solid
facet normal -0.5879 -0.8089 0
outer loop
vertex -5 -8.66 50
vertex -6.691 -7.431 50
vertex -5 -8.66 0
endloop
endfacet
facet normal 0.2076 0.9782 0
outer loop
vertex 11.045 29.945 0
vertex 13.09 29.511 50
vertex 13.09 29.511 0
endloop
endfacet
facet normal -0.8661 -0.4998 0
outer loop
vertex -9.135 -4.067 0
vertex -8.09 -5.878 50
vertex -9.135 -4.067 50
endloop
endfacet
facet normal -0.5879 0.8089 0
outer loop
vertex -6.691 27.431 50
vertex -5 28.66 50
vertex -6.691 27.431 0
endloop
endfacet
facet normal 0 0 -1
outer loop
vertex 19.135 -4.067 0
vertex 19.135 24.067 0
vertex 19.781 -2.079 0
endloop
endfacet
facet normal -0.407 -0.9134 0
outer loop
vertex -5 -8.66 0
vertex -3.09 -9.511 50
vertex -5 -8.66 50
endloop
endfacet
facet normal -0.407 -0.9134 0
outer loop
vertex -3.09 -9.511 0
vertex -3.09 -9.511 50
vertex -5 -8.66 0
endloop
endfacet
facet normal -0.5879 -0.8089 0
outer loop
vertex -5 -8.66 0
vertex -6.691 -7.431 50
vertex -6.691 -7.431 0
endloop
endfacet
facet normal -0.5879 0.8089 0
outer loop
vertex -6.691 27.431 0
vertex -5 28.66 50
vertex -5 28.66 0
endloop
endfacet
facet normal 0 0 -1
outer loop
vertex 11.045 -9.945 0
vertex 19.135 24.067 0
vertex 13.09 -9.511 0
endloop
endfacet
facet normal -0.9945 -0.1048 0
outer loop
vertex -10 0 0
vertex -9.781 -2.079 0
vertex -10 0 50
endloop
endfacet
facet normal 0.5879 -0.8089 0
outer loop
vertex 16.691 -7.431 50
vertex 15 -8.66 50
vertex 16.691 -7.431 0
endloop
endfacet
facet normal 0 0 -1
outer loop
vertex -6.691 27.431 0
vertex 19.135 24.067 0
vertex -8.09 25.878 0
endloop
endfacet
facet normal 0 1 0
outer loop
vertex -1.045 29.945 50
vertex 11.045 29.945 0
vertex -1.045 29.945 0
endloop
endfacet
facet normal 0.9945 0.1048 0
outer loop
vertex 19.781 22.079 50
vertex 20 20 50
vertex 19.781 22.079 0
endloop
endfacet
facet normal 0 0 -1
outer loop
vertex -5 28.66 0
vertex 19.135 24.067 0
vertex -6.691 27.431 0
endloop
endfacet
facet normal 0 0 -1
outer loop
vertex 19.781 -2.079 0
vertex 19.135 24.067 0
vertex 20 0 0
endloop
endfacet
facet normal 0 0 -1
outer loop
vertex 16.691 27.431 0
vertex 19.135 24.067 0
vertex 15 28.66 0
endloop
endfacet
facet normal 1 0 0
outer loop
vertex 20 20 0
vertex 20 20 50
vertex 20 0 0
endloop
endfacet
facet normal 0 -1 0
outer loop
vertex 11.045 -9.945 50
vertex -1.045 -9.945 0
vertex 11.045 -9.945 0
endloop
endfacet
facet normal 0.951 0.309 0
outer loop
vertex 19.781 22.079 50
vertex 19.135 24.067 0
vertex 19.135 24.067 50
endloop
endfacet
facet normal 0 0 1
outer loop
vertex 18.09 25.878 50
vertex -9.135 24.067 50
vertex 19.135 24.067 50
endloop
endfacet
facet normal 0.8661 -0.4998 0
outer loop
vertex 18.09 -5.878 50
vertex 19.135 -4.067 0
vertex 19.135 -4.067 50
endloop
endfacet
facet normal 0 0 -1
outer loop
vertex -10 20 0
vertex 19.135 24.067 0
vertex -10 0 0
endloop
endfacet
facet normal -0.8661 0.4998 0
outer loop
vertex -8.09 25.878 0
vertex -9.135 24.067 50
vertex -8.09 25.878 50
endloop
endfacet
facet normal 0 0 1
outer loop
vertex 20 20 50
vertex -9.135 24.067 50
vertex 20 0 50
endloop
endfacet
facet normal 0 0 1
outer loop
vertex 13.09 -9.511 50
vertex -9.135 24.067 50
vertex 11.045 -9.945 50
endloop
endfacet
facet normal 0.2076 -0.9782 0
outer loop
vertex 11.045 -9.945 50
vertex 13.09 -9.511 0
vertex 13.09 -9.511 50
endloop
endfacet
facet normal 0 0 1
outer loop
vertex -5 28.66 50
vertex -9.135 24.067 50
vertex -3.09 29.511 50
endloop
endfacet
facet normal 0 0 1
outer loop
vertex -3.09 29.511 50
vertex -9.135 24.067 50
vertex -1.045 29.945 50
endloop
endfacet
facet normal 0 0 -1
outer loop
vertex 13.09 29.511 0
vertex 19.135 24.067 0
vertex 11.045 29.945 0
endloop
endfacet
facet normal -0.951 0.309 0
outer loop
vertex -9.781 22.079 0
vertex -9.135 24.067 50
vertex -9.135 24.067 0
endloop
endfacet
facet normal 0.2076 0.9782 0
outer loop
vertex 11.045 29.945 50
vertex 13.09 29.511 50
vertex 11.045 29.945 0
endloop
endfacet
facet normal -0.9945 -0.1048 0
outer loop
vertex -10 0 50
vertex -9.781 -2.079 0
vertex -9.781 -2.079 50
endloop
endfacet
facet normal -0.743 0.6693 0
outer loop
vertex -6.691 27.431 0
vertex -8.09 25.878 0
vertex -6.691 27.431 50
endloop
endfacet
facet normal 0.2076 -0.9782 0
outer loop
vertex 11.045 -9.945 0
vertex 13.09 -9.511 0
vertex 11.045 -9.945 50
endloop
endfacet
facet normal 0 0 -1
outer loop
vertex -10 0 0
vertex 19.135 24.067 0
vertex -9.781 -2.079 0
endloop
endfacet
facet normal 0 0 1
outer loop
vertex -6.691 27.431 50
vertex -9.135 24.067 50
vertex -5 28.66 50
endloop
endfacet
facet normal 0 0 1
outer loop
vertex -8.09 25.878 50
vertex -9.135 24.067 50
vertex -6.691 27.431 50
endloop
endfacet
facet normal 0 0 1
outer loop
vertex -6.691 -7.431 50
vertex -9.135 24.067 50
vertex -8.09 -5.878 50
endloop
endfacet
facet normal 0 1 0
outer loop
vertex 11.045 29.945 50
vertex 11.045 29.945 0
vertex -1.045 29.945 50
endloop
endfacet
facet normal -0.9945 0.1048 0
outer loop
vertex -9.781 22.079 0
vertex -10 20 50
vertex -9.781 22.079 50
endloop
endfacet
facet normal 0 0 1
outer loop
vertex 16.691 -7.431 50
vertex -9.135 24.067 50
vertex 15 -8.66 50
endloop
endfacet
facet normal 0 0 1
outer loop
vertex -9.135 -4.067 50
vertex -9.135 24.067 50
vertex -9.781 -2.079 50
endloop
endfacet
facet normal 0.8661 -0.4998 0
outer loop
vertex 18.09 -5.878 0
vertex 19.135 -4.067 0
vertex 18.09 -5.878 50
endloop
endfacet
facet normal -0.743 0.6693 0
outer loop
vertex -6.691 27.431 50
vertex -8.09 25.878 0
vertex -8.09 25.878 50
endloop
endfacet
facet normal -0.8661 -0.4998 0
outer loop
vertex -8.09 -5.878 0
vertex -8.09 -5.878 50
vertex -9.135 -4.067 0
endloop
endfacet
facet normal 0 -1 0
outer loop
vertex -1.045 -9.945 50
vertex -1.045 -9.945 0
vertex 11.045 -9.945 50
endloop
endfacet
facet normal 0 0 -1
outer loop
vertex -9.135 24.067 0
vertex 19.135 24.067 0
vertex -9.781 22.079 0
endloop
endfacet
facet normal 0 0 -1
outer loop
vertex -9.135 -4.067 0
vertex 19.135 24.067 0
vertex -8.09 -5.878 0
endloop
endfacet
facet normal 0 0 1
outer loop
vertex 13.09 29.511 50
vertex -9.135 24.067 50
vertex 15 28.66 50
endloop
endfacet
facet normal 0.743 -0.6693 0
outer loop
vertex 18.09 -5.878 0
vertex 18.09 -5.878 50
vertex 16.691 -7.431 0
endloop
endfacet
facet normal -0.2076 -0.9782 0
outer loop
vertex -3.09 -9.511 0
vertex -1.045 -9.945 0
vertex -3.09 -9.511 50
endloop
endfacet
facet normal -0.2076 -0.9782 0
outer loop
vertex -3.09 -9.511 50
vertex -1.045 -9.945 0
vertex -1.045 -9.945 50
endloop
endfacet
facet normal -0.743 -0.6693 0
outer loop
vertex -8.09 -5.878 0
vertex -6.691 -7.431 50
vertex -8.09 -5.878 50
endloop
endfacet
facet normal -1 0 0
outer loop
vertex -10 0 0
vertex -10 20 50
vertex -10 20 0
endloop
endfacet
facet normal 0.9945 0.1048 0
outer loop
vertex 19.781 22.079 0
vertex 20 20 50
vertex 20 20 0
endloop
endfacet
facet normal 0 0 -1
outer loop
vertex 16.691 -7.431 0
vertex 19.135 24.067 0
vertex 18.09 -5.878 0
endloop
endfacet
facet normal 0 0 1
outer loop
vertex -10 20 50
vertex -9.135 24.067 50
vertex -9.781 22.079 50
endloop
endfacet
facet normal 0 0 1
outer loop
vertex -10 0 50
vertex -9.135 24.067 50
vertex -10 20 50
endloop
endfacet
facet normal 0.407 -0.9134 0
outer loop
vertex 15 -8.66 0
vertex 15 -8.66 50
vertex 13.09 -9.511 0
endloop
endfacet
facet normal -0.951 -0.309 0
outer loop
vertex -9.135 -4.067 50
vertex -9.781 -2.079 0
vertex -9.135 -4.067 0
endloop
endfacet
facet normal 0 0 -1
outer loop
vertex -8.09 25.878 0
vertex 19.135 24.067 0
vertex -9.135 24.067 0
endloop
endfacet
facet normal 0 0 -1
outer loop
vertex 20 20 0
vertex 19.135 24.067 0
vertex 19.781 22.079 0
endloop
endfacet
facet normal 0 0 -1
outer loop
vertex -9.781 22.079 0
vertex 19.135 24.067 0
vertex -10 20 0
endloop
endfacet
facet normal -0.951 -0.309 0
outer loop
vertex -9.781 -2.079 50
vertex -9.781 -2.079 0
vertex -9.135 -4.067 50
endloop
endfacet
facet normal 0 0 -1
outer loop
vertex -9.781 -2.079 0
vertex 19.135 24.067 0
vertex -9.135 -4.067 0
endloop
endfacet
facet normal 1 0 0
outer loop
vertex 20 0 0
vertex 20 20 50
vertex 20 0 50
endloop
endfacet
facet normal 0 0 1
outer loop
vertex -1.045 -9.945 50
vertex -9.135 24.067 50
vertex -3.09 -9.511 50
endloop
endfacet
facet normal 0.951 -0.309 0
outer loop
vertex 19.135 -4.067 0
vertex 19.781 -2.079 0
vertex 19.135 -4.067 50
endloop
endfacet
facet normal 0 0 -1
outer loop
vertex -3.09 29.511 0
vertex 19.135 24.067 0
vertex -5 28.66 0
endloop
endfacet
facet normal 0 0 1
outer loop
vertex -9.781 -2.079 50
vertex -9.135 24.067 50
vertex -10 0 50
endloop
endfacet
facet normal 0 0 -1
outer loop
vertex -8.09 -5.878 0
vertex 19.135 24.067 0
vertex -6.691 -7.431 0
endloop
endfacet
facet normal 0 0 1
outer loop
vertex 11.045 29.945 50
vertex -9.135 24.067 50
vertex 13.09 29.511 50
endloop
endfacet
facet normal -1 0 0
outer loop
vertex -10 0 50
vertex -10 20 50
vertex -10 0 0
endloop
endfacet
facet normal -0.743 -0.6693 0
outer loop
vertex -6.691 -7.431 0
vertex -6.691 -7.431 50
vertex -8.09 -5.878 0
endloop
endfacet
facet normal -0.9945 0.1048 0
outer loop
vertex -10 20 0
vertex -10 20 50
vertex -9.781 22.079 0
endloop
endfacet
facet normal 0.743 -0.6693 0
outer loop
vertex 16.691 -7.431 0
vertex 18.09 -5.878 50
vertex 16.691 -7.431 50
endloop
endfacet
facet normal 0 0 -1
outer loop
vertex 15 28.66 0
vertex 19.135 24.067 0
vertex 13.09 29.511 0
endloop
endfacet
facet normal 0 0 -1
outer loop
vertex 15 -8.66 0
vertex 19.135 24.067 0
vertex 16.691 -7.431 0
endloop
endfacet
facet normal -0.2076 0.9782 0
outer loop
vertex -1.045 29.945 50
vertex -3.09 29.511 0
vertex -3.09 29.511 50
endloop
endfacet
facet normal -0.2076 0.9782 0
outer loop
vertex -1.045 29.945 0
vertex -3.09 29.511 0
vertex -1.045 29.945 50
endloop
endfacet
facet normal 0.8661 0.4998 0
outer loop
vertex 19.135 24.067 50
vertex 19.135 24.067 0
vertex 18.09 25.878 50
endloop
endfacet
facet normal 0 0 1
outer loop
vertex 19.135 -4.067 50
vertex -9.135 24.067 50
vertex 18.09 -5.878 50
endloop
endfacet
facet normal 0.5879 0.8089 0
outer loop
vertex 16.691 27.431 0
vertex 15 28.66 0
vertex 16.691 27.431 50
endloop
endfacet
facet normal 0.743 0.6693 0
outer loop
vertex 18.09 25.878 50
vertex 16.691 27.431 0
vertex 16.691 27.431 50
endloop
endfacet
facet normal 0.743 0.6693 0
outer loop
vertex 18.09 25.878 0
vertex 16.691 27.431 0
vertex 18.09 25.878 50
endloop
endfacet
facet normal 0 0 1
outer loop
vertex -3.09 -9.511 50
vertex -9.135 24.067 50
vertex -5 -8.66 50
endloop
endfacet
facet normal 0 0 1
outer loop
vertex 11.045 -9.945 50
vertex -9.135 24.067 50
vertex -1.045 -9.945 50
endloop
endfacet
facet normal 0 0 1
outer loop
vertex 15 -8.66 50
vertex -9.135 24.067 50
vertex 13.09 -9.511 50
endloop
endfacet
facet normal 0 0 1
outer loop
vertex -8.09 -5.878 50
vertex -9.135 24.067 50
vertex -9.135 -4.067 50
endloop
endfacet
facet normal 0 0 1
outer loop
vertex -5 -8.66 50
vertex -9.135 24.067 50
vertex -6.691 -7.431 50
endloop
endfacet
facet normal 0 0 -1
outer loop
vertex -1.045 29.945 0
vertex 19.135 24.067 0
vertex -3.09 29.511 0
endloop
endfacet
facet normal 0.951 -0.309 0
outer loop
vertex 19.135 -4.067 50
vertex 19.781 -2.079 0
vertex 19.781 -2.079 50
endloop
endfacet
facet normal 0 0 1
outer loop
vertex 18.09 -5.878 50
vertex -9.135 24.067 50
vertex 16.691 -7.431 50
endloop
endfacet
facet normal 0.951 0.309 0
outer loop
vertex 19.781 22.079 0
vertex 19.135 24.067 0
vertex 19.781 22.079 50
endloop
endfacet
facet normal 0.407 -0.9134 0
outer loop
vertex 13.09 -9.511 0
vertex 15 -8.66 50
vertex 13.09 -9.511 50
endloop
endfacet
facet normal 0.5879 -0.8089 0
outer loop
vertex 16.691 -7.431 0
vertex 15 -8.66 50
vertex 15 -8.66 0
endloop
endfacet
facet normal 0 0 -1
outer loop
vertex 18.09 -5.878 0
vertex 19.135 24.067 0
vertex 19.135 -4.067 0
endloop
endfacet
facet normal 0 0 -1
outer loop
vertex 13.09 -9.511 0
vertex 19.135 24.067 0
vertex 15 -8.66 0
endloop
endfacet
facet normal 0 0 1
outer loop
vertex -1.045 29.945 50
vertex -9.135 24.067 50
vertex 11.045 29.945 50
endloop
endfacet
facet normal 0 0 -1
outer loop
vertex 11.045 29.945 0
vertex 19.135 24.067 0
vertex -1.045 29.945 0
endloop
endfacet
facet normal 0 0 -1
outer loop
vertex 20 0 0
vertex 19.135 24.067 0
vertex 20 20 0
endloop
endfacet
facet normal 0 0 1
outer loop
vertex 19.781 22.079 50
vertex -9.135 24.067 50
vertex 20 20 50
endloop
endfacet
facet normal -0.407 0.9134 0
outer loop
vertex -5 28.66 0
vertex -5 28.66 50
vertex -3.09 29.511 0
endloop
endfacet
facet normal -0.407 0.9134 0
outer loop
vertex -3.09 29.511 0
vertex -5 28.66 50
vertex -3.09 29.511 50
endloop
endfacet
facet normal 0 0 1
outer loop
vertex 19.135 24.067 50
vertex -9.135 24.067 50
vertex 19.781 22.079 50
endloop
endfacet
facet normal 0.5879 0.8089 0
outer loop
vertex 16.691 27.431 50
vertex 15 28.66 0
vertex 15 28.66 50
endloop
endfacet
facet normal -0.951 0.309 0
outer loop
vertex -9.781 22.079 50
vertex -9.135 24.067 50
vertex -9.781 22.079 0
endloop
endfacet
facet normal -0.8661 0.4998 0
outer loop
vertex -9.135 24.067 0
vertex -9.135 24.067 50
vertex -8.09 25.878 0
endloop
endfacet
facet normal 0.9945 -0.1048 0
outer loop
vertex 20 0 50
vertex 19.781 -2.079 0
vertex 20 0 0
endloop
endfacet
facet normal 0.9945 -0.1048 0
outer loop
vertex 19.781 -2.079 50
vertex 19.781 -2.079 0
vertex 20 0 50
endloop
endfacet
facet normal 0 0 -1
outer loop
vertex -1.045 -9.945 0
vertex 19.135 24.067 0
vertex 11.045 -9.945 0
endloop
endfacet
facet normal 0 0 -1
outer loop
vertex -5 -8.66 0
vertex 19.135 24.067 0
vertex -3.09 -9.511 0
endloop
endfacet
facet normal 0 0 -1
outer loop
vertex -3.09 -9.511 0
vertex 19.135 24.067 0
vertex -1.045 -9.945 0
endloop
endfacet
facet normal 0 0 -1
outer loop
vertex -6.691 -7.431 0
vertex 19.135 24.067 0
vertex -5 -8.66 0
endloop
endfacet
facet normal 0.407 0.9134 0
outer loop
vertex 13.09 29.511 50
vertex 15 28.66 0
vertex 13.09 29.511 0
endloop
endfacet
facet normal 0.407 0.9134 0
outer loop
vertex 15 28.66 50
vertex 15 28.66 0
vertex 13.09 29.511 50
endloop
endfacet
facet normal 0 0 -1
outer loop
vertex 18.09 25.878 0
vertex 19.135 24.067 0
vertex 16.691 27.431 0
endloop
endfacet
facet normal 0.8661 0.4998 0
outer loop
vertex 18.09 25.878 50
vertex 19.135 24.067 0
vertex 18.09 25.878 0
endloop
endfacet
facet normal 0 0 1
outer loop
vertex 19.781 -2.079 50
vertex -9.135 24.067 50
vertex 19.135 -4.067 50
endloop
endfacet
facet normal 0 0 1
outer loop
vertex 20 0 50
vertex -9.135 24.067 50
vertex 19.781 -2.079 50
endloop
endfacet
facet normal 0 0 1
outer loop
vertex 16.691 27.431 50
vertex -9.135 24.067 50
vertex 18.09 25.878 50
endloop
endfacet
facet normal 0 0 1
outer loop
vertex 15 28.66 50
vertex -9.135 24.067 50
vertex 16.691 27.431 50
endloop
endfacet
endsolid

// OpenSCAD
minkowski(){
cube([10.0,20.0,30.0]);
cylinder(r=10.0,h=20.0);
}
